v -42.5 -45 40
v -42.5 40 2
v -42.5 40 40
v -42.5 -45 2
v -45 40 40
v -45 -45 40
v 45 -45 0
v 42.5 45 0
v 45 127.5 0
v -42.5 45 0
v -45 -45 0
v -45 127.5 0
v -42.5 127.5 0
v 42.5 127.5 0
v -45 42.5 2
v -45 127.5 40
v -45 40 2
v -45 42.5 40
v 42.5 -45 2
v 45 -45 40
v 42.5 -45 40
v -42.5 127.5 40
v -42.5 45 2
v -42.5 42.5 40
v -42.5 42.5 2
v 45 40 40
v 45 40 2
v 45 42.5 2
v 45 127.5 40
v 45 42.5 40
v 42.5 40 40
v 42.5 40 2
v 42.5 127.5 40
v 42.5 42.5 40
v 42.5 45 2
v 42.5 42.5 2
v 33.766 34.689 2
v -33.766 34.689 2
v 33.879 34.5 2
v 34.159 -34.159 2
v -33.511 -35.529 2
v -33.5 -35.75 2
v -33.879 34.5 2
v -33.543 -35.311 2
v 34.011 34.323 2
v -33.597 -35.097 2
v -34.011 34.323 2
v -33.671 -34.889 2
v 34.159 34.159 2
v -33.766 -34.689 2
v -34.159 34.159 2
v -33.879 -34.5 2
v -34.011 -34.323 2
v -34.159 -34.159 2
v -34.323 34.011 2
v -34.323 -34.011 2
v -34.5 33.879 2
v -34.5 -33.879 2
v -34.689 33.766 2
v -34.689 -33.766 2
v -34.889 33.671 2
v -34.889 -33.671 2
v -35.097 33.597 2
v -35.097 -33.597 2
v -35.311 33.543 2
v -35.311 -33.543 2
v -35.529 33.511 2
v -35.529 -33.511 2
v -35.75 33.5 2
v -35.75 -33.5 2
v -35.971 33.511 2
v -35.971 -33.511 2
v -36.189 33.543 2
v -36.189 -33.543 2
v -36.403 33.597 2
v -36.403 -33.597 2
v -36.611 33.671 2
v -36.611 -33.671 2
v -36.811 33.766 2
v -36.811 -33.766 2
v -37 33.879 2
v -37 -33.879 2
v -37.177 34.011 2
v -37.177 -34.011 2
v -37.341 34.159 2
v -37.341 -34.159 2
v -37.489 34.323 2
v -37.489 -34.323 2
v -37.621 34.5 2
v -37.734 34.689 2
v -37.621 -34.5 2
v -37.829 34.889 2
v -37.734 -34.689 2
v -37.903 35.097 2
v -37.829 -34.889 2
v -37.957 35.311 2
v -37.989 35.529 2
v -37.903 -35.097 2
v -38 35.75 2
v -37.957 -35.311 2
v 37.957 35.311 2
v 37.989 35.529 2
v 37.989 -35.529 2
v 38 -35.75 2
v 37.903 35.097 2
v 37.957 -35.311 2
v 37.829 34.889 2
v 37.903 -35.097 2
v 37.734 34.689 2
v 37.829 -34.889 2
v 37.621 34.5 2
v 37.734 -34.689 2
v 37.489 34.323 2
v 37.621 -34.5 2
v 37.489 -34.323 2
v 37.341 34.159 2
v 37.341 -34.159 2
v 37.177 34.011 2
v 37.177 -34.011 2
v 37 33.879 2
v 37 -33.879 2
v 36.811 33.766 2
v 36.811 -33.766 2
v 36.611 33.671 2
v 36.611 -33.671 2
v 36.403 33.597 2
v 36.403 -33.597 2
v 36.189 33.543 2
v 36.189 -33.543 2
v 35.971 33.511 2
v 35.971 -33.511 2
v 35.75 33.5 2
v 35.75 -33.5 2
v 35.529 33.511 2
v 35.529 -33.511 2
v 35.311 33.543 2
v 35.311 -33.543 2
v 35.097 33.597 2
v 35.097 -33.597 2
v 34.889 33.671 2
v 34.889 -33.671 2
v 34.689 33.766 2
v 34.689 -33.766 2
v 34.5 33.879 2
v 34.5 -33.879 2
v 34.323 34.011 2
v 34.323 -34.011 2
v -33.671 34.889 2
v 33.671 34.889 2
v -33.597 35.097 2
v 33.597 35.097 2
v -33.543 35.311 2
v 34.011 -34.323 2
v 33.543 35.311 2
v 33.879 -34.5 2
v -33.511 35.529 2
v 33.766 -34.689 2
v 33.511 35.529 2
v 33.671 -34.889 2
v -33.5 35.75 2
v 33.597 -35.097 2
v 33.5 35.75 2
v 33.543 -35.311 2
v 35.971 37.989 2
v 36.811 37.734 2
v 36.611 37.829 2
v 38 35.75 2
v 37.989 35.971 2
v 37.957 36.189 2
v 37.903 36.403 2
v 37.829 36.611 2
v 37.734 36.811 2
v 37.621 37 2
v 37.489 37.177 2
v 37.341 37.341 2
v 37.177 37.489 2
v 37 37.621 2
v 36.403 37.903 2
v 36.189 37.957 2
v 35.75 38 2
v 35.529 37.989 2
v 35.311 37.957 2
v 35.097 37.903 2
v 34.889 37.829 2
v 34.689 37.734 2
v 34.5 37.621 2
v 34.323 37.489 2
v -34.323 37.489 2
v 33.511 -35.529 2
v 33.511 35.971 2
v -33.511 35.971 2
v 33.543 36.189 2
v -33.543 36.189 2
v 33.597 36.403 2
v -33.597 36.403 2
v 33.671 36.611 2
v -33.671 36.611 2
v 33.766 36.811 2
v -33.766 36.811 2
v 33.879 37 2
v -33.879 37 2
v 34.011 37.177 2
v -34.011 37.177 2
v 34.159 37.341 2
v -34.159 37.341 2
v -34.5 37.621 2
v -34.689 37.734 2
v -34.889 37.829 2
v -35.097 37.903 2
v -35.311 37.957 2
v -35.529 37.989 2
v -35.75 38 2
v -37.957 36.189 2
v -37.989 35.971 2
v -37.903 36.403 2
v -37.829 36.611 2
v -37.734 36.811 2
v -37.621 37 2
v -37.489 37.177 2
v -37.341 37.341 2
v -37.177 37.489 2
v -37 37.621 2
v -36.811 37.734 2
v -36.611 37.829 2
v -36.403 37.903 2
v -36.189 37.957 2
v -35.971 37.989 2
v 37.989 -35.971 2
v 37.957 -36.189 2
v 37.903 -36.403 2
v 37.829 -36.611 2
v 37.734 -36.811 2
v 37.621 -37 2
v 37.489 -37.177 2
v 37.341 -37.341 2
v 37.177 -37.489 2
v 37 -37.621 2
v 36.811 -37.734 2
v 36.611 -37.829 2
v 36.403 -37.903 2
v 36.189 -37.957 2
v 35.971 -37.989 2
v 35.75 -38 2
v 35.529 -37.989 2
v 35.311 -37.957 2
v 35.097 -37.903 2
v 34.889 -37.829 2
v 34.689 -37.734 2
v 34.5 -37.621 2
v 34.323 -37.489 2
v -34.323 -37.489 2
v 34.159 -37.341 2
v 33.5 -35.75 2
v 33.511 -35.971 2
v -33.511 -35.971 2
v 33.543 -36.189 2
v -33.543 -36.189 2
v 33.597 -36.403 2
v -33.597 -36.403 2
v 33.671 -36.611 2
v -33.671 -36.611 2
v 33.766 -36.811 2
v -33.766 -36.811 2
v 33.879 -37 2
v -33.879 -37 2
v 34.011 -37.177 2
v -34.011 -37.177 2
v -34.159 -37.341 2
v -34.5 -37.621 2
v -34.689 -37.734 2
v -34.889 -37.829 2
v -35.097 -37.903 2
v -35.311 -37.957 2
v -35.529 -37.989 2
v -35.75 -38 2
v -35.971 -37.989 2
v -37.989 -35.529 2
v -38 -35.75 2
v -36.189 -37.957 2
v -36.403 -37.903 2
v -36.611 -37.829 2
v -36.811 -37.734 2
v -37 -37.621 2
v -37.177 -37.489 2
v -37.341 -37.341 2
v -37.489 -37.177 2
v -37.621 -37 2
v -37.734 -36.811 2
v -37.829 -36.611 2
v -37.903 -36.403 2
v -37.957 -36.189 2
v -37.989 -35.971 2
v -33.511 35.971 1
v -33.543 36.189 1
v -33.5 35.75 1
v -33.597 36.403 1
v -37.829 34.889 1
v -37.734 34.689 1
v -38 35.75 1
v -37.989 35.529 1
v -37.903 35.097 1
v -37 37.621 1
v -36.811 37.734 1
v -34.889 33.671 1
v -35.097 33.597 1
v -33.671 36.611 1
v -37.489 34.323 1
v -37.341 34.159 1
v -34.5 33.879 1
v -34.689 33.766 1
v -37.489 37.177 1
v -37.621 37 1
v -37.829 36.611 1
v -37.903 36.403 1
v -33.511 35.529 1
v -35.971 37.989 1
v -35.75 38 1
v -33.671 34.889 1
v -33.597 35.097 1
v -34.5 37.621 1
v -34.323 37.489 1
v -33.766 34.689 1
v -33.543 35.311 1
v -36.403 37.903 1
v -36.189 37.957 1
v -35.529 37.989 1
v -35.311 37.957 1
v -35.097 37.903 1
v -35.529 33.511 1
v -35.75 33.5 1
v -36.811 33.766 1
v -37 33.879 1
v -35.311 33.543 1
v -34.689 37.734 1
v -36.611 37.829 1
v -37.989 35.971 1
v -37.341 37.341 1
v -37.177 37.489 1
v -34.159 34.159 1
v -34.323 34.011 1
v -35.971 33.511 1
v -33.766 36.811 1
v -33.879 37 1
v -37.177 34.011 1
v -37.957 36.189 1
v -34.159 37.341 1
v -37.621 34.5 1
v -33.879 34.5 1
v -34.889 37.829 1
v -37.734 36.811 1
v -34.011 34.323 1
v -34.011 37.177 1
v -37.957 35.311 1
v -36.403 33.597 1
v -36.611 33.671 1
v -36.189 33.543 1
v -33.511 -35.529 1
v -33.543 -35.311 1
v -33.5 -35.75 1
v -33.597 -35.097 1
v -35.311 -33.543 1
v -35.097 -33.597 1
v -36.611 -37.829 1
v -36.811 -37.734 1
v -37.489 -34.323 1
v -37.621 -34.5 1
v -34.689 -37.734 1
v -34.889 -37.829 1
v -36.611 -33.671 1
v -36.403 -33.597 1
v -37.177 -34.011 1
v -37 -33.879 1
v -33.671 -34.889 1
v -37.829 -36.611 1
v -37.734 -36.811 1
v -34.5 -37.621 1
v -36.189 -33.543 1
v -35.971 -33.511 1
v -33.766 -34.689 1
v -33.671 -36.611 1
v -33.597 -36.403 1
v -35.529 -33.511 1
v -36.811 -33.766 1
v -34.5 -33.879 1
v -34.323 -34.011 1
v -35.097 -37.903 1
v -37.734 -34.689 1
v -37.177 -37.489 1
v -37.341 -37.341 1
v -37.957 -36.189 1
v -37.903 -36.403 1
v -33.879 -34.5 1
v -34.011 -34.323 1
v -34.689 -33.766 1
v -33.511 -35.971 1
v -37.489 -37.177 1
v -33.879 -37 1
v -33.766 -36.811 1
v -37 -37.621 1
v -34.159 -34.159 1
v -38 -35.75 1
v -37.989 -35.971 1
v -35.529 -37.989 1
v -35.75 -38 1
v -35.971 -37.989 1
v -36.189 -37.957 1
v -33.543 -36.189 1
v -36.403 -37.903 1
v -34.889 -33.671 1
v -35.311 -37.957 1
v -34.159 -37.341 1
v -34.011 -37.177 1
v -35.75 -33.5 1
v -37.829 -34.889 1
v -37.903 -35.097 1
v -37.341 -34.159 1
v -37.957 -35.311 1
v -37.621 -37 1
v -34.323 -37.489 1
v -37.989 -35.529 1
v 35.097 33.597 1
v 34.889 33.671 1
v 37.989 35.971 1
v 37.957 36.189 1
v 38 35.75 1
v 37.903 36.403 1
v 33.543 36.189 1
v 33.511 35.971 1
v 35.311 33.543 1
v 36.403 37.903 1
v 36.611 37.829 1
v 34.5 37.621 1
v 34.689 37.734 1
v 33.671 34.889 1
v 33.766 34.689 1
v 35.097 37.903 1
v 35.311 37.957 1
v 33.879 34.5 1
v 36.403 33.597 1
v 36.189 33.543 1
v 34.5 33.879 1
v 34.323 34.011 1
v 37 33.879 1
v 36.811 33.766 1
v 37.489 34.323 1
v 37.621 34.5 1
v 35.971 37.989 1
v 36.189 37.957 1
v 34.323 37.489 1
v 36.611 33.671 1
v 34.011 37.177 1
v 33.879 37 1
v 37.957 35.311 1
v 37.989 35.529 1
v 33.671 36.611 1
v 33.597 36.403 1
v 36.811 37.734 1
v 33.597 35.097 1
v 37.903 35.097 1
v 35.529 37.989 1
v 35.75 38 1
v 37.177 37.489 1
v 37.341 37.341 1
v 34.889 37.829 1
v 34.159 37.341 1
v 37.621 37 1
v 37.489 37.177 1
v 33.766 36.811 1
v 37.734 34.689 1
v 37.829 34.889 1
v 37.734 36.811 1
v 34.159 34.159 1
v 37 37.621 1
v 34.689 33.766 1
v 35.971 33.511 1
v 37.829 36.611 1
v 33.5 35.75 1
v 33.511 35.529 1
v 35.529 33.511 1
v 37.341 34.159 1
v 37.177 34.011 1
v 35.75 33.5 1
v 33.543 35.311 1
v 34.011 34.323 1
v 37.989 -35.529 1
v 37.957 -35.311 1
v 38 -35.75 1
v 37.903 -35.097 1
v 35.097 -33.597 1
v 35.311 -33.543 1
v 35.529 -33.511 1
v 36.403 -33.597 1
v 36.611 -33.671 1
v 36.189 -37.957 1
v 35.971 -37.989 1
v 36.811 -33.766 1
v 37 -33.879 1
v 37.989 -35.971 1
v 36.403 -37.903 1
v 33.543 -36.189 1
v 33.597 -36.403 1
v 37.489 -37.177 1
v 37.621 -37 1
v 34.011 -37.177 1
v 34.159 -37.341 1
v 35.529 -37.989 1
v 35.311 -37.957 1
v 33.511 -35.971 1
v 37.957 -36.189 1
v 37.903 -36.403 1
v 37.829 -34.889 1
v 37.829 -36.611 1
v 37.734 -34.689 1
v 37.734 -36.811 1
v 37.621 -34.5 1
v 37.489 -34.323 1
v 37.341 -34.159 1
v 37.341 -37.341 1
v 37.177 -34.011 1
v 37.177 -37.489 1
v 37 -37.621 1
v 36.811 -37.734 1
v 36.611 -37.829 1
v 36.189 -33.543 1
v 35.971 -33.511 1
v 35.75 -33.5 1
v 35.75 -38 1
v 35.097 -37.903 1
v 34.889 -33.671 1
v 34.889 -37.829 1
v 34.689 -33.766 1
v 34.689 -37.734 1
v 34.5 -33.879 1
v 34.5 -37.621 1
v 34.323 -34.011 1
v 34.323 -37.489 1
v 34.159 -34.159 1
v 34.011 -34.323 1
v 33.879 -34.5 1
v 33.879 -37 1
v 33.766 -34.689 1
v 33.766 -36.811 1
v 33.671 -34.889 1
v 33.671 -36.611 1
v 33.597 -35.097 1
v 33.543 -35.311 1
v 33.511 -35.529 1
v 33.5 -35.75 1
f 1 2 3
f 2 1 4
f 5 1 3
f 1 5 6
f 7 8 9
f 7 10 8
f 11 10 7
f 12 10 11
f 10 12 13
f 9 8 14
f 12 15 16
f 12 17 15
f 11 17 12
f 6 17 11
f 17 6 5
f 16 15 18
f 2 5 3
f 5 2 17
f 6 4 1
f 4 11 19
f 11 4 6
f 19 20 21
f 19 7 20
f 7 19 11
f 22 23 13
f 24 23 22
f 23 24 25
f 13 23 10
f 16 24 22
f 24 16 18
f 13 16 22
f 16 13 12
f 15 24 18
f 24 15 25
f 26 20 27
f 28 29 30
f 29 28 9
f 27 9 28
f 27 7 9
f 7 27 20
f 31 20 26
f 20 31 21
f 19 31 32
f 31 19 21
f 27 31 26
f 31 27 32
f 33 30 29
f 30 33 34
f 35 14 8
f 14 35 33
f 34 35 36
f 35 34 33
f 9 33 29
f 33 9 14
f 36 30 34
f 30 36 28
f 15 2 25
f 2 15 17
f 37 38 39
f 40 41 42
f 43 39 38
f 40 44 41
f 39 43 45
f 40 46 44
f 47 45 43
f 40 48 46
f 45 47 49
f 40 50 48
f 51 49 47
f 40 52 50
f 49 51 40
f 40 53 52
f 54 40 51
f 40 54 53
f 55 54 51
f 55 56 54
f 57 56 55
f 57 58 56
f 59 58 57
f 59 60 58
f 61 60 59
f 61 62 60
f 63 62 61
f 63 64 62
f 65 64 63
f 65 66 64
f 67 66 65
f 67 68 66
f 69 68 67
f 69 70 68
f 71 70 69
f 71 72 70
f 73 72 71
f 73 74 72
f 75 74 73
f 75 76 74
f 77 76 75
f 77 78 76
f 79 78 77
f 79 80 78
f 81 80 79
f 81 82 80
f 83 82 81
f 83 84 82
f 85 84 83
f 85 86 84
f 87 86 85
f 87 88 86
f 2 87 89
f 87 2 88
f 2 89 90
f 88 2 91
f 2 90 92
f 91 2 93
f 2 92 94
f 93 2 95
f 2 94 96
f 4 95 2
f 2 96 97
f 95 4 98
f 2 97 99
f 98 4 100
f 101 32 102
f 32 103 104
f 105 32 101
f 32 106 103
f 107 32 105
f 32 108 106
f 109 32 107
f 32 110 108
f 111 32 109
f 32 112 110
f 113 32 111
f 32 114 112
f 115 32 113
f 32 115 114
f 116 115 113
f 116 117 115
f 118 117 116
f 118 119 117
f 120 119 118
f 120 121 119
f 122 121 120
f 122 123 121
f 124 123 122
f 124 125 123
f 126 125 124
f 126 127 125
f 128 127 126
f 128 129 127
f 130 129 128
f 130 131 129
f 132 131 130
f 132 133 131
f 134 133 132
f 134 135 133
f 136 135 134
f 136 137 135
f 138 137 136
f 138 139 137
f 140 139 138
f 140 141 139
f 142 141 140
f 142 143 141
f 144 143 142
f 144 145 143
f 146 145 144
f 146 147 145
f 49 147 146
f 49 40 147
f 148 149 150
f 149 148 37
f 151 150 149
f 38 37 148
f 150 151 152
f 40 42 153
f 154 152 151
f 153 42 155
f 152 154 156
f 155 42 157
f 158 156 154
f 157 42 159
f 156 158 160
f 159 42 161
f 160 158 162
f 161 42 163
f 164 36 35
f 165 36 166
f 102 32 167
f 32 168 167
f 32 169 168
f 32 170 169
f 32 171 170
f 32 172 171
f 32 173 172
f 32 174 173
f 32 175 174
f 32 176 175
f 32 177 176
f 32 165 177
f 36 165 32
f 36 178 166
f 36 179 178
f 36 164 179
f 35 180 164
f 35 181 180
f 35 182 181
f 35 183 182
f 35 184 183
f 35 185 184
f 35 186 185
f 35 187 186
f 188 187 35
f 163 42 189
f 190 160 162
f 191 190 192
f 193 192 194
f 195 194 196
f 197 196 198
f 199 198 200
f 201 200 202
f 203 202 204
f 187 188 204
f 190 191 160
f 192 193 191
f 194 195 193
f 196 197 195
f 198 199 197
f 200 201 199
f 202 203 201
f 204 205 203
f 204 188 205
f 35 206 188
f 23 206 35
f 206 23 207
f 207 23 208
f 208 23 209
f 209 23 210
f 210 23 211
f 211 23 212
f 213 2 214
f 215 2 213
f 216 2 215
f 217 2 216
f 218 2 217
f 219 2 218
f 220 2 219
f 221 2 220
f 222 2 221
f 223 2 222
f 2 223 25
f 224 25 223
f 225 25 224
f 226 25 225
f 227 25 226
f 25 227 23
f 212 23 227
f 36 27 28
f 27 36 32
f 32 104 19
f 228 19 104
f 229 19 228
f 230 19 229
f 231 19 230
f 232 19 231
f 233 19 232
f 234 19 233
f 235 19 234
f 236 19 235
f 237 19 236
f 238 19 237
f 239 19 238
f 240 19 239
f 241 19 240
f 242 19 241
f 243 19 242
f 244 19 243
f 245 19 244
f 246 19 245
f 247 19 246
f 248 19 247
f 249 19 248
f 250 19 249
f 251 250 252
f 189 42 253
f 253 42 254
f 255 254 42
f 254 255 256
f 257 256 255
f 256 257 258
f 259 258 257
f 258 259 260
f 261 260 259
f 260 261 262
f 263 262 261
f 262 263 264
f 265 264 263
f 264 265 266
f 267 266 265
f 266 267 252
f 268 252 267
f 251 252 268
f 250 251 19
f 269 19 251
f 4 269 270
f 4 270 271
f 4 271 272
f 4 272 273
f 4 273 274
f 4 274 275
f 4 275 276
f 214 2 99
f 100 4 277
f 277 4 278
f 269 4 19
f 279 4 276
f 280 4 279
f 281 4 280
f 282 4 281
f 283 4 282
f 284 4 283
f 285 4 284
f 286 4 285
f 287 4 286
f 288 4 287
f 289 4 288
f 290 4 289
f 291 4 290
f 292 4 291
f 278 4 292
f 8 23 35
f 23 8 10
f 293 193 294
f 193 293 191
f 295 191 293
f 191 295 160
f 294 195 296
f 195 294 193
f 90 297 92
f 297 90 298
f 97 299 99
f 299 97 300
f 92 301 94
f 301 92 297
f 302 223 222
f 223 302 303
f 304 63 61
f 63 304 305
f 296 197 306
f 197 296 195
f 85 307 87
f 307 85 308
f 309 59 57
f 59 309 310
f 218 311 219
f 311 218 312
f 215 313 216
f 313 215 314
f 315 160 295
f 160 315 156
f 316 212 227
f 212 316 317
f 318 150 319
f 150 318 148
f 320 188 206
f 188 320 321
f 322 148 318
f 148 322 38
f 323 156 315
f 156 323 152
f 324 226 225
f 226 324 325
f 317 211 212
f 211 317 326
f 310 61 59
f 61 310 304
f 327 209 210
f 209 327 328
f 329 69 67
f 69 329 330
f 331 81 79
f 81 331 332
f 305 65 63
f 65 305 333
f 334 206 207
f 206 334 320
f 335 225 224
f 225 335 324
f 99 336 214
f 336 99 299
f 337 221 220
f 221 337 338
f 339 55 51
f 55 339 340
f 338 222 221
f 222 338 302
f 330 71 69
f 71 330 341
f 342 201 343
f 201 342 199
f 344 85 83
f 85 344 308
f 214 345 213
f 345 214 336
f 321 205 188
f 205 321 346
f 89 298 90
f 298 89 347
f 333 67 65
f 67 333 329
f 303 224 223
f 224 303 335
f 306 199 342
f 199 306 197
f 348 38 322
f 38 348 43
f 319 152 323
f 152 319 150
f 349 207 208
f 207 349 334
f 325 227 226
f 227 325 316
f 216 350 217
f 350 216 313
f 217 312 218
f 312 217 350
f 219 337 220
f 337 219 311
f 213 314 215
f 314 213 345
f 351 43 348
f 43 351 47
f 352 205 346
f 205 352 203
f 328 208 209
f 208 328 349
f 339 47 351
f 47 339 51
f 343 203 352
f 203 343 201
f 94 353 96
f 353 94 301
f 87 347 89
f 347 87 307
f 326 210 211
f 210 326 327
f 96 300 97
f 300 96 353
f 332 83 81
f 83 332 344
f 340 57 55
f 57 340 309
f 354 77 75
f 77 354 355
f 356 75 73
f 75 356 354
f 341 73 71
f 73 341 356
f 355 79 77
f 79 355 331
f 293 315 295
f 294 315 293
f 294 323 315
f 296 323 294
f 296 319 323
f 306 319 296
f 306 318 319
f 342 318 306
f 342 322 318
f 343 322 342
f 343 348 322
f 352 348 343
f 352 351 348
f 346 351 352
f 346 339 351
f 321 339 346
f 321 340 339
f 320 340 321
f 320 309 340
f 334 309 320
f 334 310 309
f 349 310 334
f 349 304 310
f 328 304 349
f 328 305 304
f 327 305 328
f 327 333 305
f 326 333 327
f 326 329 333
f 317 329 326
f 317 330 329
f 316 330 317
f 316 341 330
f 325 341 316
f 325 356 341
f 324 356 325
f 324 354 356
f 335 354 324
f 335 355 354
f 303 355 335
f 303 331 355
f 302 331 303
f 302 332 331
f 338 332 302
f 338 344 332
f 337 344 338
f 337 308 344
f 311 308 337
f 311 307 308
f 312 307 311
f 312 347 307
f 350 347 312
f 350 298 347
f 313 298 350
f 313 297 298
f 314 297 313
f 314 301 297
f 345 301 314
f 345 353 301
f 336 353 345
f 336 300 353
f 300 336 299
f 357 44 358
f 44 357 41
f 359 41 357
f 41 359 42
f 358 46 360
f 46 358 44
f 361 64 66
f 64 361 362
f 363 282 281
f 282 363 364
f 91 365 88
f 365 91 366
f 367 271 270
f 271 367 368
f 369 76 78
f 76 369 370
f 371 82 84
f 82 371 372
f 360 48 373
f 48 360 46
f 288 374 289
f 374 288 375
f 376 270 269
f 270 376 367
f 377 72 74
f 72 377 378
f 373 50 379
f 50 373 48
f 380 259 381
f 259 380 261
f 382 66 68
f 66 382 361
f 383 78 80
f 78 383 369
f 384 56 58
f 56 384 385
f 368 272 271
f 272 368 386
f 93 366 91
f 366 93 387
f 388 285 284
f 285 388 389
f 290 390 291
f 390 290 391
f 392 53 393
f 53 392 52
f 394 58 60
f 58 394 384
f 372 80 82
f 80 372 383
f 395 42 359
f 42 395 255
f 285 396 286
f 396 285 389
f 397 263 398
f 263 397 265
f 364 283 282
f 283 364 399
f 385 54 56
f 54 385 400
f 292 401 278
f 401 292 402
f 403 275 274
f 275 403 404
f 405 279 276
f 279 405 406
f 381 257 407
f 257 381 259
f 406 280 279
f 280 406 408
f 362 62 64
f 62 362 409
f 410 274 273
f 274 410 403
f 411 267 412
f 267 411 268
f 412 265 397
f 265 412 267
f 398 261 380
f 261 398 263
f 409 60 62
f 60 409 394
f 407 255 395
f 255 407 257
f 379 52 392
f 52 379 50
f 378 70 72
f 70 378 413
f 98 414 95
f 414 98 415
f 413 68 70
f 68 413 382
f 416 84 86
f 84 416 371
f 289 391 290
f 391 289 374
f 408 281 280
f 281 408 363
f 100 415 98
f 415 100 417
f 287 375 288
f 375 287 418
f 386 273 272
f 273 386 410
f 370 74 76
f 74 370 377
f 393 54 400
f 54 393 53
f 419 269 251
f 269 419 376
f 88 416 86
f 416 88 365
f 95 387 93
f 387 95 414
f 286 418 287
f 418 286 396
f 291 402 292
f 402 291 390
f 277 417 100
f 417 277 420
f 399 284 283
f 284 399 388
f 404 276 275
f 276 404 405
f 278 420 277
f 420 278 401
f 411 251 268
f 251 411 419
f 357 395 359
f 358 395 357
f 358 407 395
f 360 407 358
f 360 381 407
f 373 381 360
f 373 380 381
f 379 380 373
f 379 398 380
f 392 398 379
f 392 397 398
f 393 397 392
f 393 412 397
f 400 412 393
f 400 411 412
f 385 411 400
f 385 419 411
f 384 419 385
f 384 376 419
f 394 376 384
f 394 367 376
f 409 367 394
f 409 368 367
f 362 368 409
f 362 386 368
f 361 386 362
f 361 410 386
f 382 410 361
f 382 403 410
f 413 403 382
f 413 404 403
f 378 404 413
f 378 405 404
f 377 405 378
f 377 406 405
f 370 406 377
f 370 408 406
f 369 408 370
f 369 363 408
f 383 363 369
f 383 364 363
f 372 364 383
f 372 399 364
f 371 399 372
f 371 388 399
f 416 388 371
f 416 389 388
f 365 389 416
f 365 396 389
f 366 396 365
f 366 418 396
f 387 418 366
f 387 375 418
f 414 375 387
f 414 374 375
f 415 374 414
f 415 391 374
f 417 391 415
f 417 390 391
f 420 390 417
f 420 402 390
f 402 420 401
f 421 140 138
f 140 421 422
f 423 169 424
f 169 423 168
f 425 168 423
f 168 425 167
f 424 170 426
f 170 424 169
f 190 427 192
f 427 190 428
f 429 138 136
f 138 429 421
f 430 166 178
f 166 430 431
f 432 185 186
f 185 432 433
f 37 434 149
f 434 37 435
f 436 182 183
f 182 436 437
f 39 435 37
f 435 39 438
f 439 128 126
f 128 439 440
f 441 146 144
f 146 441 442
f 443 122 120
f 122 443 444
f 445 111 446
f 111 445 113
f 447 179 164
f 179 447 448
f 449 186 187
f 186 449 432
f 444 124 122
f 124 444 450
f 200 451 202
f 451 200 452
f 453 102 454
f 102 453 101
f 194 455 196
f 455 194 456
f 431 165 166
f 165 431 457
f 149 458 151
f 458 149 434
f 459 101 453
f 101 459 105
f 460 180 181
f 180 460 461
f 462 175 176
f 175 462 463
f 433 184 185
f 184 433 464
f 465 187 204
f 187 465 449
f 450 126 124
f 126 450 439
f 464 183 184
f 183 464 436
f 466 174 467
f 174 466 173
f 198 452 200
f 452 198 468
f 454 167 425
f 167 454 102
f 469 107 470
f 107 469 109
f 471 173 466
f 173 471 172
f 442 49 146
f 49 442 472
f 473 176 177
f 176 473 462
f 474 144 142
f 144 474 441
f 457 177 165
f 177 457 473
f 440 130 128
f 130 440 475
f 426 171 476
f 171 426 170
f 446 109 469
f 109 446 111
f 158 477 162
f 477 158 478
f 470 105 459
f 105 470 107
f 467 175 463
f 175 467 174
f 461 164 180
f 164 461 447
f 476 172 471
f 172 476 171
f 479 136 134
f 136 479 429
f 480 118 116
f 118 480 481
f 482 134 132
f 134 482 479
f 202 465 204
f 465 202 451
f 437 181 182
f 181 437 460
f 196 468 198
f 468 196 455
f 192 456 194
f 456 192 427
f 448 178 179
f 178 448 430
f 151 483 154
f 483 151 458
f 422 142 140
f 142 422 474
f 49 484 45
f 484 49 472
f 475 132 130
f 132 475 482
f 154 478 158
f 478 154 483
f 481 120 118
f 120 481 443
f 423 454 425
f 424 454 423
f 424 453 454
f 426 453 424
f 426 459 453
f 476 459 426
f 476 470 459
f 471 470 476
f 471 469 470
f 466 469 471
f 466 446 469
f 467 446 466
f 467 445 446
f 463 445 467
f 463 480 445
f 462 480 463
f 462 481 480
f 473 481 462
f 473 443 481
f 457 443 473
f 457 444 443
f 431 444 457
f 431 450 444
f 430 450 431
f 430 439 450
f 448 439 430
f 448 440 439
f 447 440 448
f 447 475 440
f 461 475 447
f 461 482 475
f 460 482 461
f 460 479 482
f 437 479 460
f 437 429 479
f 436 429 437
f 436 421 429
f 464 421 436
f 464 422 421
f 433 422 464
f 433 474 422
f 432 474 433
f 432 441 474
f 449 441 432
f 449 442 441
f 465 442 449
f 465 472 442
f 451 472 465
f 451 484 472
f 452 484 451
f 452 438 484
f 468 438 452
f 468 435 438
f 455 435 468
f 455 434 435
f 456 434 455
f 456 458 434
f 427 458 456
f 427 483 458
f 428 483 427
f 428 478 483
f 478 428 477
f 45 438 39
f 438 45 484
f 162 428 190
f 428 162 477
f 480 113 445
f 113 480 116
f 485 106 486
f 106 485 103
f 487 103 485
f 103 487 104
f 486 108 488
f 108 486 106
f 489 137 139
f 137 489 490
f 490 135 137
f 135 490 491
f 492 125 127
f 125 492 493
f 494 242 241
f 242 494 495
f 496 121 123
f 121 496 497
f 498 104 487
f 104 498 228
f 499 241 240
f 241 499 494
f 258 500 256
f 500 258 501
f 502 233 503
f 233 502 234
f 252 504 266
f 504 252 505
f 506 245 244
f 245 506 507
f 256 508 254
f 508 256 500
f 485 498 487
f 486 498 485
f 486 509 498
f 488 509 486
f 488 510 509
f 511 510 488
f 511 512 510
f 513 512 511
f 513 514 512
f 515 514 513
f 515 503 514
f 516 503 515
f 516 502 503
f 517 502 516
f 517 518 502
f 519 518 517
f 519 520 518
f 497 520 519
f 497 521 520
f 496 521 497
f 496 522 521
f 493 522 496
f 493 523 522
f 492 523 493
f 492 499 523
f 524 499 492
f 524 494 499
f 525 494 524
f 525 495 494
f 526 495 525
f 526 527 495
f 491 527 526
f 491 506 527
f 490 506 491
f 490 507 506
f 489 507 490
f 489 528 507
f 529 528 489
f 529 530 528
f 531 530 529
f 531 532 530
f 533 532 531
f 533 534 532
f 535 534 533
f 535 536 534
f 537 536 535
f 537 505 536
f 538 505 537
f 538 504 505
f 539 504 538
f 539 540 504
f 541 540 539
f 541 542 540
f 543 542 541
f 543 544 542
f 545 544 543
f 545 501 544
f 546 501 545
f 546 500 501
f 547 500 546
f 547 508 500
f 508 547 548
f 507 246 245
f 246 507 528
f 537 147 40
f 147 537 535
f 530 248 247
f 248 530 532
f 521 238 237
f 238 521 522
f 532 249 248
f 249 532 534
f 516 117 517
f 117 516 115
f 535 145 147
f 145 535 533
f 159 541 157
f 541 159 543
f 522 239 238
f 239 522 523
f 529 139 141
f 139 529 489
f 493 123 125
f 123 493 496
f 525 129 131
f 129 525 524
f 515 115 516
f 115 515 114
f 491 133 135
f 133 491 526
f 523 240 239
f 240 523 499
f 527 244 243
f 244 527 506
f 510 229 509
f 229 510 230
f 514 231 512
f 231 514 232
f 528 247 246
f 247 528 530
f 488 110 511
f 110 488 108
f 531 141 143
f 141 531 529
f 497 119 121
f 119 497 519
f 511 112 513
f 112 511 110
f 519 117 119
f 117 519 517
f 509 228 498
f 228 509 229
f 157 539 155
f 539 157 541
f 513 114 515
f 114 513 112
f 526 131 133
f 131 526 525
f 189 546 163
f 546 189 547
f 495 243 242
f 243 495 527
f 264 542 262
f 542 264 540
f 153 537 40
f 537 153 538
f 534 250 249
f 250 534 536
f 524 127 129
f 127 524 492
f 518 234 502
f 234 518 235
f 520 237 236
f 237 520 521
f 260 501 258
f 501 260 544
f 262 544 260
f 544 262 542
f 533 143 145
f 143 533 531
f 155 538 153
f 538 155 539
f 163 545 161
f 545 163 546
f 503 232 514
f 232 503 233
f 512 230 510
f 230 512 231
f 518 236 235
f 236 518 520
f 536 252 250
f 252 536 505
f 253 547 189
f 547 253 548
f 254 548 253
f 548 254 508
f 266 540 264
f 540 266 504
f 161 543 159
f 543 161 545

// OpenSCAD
// Magnetic stirrer housing - upside-down open box over a 80 mm PC fan
// Print orientation: top plate on bed (z = 0..2), walls rise to z = 40

// ---------- Parameters ----------
box_outer_x      = 90;    // outer size in X (mm)
box_outer_y      = 90;    // outer size in Y (mm)
top_plate_t      = 2;     // top plate thickness (mm)
wall_t           = 2.5;   // wall thickness (mm)
wall_top_z       = 40;    // height of open top (mm)
screw_hole_d     = 4.5;   // M4 screw hole diameter (mm)
screw_pattern_a  = 71.5;  // square pitch of screw holes (mm)
notch_w          = 12;    // cable notch width (mm)
notch_bottom_z   = 32;    // notch floor height (mm)
eps              = 0.5;   // cutter overshoot past faces (mm)
$fn              = 64;    // curve resolution

// ---------- Model ----------
difference() {
    // Solid body: top plate + four walls, open top
    union() {
        // Top plate
        translate([-box_outer_x/2, -box_outer_y/2, 0])
            cube([box_outer_x, box_outer_y, top_plate_t]);
        // Walls
        for (sx = [-1, 1], sy = [-1, 1])
            translate([sx > 0 ? box_outer_x/2 - wall_t : -box_outer_x/2,
                       sy > 0 ? box_outer_y/2 - wall_t : -box_outer_y/2,
                       0])
                cube([wall_t, box_outer_y - 2*wall_t, wall_top_z]);
    }

    // Screw holes through top plate, centred on plate
    for (i = [0, 1, 2, 3])
        translate([(i < 2 ? -1 : 1) * screw_pattern_a/2,
                   (i % 2 ? -1 : 1) * screw_pattern_a/2,
                   top_plate_t/2])
            cylinder(d = screw_hole_d, h = top_plate_t + eps);

    // Cable notch in one wall: 12 mm wide, centred along wall,
    // from z = 32 up to above the open edge (eps past z = 40)
    translate([-box_outer_x/2 + wall_t + eps,
               -box_outer_y/2 + wall_t,
               notch_bottom_z])
        cube([notch_w, box_outer_y - 2*wall_t, wall_top_z - notch_bottom_z + eps]);
}
